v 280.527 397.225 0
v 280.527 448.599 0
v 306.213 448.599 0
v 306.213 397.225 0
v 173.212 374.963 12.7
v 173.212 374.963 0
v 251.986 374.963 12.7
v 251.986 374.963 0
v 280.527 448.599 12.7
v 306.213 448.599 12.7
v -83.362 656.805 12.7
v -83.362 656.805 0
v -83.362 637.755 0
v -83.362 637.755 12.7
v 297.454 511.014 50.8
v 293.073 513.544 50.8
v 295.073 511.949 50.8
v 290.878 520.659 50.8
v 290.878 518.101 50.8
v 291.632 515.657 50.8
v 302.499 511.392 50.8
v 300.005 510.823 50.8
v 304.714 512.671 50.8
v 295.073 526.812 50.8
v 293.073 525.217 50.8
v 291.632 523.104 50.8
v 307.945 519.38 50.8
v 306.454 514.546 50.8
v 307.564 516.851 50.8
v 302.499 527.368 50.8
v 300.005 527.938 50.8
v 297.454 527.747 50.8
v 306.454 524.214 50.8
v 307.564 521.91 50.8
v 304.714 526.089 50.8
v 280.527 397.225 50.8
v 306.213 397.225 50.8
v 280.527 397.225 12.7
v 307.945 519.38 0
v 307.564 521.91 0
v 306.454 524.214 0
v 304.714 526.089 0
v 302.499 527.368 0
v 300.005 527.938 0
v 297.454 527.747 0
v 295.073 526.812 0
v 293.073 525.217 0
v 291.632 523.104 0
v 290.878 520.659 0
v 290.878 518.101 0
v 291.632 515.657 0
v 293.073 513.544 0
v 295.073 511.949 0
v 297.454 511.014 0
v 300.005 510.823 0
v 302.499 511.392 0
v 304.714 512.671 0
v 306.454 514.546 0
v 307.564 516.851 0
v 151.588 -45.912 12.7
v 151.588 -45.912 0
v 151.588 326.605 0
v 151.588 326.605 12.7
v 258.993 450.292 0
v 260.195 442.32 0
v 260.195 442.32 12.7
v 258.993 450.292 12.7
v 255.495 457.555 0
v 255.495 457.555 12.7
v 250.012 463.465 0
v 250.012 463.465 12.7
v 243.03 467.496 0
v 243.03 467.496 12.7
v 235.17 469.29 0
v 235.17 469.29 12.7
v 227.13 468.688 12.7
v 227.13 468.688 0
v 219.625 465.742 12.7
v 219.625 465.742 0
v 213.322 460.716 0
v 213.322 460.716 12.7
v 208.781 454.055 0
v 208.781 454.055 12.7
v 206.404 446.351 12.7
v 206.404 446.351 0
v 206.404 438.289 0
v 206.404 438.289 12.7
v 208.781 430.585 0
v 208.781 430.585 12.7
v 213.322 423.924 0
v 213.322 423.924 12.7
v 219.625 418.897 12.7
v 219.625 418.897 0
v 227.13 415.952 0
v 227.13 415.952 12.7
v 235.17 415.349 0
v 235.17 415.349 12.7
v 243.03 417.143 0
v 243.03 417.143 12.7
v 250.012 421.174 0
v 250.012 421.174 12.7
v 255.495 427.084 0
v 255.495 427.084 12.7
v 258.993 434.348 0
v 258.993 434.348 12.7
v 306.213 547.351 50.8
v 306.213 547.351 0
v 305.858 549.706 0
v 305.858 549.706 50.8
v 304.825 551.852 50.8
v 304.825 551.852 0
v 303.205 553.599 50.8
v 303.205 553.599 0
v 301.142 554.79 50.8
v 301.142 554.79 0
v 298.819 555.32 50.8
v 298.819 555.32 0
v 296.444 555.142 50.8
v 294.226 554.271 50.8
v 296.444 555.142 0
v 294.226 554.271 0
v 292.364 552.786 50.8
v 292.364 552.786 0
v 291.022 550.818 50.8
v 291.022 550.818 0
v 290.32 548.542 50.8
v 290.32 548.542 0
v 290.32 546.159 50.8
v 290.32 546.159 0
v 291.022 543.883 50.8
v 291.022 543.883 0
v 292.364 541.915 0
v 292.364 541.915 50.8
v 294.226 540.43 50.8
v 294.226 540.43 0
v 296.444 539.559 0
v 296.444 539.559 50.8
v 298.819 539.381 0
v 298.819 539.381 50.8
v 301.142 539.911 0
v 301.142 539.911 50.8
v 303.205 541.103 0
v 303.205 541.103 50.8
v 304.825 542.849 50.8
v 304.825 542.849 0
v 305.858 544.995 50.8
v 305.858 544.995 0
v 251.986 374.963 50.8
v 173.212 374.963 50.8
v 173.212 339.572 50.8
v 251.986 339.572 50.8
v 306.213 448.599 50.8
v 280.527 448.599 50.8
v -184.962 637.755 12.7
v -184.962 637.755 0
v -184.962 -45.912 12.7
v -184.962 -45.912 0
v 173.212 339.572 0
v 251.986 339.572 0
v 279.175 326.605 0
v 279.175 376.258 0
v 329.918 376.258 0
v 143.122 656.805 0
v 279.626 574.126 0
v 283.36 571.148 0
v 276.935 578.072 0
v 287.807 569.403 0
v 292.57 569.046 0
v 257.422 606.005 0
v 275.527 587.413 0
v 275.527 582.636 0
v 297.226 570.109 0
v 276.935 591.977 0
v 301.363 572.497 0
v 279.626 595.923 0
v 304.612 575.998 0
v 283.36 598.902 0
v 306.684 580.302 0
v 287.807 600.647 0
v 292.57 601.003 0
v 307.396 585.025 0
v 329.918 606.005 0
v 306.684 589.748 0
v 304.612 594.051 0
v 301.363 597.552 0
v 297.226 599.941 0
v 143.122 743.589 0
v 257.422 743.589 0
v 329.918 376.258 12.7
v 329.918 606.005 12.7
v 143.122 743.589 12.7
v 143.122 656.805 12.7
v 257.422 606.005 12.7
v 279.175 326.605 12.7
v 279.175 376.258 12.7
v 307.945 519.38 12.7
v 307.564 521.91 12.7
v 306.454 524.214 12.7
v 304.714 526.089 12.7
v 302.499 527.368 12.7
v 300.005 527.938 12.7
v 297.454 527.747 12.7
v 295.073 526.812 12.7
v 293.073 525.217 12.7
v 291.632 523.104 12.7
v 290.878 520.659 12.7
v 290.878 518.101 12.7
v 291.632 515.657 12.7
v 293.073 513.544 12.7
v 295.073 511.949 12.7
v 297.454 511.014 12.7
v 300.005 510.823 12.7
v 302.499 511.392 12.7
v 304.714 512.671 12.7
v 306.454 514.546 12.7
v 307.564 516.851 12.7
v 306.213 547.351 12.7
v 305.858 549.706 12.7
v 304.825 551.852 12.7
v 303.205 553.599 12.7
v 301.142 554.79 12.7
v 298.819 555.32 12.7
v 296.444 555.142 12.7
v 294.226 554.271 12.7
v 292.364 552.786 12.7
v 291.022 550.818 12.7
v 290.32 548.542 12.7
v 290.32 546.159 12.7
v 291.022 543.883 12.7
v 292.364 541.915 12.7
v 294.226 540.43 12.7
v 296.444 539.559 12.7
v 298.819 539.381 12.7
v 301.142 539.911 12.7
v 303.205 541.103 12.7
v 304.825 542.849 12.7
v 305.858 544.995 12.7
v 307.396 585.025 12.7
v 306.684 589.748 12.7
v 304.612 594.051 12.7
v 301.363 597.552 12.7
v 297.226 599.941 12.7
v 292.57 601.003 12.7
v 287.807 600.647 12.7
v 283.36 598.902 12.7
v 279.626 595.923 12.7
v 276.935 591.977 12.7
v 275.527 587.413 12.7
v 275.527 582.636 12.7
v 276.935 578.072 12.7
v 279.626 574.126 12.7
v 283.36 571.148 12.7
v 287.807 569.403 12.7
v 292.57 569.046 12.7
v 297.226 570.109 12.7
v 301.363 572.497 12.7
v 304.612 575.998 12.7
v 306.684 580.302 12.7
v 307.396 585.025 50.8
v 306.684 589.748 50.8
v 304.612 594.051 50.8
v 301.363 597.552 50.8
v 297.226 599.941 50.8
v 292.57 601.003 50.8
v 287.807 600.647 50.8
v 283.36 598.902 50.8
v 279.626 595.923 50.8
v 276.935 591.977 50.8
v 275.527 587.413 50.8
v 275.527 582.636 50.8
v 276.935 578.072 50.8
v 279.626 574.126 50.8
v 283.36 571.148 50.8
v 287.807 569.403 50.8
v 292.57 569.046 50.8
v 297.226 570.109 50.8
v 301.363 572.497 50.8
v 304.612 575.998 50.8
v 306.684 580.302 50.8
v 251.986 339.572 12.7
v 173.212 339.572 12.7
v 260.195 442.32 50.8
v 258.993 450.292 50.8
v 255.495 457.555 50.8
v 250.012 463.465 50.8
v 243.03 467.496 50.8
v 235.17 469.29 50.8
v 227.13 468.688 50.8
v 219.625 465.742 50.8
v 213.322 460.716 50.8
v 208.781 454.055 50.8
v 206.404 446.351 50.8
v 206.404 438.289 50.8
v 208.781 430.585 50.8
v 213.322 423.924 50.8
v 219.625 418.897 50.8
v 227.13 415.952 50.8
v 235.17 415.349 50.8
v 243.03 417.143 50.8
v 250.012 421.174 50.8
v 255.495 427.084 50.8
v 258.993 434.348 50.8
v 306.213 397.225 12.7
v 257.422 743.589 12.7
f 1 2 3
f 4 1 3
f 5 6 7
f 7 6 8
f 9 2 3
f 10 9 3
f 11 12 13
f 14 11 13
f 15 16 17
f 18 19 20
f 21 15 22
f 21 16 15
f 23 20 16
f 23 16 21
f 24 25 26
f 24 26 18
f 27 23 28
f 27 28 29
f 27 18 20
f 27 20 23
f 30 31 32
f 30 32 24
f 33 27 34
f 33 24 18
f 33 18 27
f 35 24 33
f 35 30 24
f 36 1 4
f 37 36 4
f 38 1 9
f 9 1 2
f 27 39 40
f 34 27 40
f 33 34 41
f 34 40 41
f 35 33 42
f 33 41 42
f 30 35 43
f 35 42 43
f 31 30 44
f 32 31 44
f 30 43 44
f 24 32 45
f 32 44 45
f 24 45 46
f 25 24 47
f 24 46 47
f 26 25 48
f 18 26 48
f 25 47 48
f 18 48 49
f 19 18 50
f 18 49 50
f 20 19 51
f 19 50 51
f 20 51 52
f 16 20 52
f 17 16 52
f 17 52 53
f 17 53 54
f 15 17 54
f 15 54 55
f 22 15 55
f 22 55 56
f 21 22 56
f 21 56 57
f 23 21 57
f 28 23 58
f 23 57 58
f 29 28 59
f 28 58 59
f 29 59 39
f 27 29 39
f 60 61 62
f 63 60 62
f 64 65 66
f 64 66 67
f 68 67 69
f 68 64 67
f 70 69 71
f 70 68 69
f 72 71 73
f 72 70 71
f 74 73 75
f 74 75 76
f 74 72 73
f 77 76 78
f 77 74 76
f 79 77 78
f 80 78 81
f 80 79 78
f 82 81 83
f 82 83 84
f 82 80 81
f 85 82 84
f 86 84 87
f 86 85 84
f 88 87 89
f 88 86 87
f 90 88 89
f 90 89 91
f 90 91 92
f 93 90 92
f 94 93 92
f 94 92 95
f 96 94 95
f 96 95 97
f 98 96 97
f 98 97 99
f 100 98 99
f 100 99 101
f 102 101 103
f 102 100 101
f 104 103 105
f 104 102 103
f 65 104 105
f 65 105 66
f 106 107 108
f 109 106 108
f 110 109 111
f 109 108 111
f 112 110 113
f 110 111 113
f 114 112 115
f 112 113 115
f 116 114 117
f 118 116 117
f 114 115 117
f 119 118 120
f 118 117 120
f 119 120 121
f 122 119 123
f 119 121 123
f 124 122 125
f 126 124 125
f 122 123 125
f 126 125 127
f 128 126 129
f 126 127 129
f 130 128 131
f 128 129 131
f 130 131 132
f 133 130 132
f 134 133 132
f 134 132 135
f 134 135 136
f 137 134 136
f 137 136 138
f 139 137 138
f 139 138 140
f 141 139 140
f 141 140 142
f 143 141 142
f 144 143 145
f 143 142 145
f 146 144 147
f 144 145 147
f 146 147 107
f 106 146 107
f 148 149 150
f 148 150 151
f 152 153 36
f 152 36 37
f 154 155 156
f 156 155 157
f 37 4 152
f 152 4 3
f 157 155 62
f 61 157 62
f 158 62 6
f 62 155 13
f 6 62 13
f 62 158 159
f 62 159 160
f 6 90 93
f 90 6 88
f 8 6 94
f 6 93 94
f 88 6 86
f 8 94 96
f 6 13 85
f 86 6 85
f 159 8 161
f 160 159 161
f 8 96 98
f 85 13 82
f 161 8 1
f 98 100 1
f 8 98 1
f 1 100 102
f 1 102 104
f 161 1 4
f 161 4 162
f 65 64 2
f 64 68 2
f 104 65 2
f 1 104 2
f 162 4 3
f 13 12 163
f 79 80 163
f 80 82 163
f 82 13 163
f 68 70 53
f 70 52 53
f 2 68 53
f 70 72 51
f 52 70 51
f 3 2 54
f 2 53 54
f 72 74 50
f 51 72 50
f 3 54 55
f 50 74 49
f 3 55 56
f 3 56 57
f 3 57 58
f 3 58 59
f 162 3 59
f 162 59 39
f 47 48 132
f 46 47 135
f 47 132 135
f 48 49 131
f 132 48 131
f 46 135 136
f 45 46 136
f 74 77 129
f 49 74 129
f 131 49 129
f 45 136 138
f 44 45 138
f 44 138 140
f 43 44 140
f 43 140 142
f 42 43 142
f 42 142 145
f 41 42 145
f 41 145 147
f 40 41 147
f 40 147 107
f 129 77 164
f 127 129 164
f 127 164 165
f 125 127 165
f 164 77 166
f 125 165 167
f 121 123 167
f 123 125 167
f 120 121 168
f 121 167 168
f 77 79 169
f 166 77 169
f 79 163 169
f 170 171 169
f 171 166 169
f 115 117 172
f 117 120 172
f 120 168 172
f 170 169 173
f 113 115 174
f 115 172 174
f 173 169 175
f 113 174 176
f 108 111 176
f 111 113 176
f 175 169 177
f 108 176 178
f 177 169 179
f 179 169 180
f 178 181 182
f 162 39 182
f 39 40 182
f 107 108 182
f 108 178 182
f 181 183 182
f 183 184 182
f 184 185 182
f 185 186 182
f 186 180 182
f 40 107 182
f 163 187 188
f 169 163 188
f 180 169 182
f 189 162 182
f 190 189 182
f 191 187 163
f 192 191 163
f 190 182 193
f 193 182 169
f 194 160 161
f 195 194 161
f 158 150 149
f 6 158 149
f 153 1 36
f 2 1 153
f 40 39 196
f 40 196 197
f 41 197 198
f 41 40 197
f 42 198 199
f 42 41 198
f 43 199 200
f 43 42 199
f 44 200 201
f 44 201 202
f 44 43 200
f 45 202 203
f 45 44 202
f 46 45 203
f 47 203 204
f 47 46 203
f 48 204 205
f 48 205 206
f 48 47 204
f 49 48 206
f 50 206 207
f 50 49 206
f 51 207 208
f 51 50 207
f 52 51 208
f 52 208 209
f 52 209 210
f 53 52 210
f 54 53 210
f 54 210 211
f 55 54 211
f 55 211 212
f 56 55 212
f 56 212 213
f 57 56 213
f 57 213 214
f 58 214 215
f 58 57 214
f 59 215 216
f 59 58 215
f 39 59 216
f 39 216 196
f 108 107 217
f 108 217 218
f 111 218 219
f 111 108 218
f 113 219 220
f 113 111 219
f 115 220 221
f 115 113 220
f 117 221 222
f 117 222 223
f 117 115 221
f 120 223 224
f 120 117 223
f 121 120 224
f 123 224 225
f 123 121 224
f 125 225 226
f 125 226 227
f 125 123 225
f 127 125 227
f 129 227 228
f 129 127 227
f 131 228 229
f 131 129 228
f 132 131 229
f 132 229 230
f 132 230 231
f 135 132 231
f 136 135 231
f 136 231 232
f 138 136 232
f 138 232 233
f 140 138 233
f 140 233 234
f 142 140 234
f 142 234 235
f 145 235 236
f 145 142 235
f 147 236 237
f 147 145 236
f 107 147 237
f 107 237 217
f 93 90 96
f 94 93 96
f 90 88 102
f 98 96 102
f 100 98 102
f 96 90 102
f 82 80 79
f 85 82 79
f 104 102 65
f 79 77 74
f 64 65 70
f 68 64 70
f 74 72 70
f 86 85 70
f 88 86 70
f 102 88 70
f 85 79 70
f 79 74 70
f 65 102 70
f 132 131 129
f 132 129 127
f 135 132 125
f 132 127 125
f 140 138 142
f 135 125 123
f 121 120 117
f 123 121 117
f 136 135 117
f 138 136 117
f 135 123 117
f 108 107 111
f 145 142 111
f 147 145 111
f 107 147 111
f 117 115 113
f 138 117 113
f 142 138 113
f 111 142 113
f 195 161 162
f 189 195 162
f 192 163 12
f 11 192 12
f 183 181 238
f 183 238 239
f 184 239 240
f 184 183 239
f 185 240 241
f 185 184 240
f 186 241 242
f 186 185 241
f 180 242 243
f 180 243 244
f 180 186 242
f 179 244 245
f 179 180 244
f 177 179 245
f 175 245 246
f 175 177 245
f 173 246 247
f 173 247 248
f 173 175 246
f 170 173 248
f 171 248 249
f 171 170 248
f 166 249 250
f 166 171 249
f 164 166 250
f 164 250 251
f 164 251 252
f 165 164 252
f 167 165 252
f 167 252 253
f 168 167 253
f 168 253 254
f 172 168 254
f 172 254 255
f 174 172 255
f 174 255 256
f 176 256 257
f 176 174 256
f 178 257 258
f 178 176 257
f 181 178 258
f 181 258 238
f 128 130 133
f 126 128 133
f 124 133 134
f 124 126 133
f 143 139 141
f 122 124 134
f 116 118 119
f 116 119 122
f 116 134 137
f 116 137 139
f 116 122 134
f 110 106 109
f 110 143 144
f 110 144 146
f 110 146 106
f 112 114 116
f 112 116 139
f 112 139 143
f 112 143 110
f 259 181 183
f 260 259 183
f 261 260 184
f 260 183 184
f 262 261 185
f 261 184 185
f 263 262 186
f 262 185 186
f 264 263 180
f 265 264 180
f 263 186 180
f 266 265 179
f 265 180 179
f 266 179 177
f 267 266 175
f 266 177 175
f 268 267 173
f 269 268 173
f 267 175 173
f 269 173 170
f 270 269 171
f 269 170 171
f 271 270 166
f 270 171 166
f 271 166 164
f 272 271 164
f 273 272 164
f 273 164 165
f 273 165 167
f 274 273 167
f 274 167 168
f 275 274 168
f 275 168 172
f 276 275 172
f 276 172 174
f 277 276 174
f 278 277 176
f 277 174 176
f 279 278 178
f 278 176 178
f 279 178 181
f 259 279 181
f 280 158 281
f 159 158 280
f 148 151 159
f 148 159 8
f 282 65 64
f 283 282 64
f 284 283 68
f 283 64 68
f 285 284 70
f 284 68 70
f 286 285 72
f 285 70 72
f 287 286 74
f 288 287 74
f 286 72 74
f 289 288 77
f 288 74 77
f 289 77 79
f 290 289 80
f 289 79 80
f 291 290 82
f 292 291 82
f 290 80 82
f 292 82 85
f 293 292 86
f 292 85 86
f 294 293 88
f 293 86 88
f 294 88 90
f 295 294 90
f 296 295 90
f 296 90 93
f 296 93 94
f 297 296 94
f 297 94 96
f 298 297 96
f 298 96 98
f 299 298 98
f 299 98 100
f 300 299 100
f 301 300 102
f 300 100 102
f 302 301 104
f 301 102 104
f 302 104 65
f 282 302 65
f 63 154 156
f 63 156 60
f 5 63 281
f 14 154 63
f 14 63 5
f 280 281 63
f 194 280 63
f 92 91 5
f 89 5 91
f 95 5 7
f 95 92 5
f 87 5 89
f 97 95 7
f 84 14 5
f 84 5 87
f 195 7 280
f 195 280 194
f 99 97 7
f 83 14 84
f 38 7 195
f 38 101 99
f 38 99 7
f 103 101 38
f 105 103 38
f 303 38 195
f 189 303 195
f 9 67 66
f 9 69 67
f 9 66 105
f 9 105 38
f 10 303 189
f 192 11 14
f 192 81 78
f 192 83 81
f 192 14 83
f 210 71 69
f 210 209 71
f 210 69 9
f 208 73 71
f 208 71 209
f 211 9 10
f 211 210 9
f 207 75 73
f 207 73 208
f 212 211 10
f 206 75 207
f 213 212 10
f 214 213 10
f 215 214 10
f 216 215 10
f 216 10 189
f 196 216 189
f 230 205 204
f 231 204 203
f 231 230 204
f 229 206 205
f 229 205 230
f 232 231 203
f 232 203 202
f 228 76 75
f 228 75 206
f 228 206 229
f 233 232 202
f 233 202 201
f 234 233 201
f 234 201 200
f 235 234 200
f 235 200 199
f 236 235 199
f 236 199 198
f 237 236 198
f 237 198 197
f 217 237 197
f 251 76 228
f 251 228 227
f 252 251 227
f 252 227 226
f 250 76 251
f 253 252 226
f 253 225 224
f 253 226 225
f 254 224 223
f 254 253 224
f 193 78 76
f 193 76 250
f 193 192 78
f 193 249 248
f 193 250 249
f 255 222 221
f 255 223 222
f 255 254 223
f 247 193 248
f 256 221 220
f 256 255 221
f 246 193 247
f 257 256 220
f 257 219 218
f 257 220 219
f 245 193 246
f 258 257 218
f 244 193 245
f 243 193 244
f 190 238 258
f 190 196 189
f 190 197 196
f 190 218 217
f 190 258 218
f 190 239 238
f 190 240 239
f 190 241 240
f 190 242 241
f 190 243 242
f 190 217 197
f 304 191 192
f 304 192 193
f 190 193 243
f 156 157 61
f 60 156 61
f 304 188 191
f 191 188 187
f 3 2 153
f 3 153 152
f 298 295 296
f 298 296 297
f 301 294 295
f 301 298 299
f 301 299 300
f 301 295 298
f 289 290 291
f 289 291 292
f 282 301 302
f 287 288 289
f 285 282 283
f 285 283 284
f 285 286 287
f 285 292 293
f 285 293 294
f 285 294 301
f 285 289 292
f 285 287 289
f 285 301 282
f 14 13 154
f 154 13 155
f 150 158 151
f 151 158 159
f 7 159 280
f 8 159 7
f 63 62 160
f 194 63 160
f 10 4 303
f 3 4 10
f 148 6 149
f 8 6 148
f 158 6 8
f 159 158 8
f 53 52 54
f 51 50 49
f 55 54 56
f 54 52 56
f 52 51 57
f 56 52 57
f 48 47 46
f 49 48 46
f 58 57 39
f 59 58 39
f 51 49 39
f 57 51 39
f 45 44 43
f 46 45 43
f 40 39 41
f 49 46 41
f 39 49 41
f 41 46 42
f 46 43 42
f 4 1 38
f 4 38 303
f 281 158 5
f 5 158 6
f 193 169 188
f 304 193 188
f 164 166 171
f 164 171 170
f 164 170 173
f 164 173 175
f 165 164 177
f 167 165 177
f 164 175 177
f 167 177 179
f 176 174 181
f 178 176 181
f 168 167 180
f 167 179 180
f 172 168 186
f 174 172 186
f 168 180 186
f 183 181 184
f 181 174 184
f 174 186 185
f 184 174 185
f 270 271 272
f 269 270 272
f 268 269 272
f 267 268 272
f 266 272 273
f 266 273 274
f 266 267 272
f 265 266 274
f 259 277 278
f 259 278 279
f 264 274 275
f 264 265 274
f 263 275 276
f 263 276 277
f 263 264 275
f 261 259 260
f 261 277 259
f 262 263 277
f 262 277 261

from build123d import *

# Parameters (mm, degrees)
F0_R     = 27.046255
F1_DEPTH = 50.8
F0_W     = 25.68686
F0_H     = 51.37375
F2_DEPTH = 50.8
F0_W_2   = 78.773111
F0_H_2   = 35.390824
F3_DEPTH = 50.8
F0_R_2   = 8.581332
F0_R_3   = 16.023706
F0_R_4   = 7.991493
F4_DEPTH = 50.8
F0_W_3   = 336.55
F0_H_3   = 372.5164
F5_DEPTH = 12.7


with BuildPart() as f1:
    # F0 (on Top) → F1 (new body)
    with BuildSketch(Plane.XY):
        with Locations((233.148515, 442.319661)):
            Circle(F0_R)
    extrude(amount=F1_DEPTH)


with BuildPart() as f2:
    # F0 (on Top) → F2 (new body)
    with BuildSketch(Plane.XY):
        with Locations((293.369979, 422.911808)):
            Rectangle(F0_W, F0_H)
    extrude(amount=F2_DEPTH)


with BuildPart() as f3:
    # F0 (on Top) → F3 (new body)
    with BuildSketch(Plane.XY):
        with Locations((212.598995, 357.267544)):
            Rectangle(F0_W_2, F0_H_2)
    extrude(amount=F3_DEPTH)


with BuildPart() as f4:
    # F0 (on Top) → F4 (new body)
    with BuildSketch(Plane.XY):
        with Locations((299.363583, 519.380331)):
            Circle(F0_R_2)
        with Locations((291.37212, 585.024595)):
            Circle(F0_R_3)
        with Locations((298.221946, 547.350526)):
            Circle(F0_R_4)
    extrude(amount=F4_DEPTH)


with BuildPart() as f5:
    # F0 (on Top) → F5 (new body)
    with BuildSketch(Plane.XY):
        Polygon((-184.961865, 326.604622), (151.588135, 326.604622), (151.588135, 381.638802), (270.769119, 606.004622), (257.422315, 606.004622), (257.422315, 743.588802), (143.122315, 743.588802), (143.122315, 656.804622), (-60.077685, 656.804622), (-83.361865, 656.804622), (-83.361865, 637.754622), (-184.961865, 637.754622), align=None)
        with Locations((-16.686865, 140.346422)):
            Rectangle(F0_W_3, F0_H_3)
        Polygon((151.588135, 381.638802), (151.588135, 326.604622), (279.17546, 326.604622), (279.17546, 376.258105), (329.918176, 376.258105), (329.918176, 606.004622), (270.769119, 606.004622), align=None)
        with Locations((212.598995, 357.267544)):
            Rectangle(F0_W_2, F0_H_2, mode=Mode.SUBTRACT)
        with Locations((233.148515, 442.319661)):
            Circle(F0_R, mode=Mode.SUBTRACT)
        with Locations((293.369979, 422.911808)):
            Rectangle(F0_W, F0_H, mode=Mode.SUBTRACT)
        with Locations((299.363583, 519.380331)):
            Circle(F0_R_2, mode=Mode.SUBTRACT)
        with Locations((291.37212, 585.024595)):
            Circle(F0_R_3, mode=Mode.SUBTRACT)
        with Locations((298.221946, 547.350526)):
            Circle(F0_R_4, mode=Mode.SUBTRACT)
    extrude(amount=F5_DEPTH)


solid = Compound([f1.part, f2.part, f3.part, f4.part, f5.part])
